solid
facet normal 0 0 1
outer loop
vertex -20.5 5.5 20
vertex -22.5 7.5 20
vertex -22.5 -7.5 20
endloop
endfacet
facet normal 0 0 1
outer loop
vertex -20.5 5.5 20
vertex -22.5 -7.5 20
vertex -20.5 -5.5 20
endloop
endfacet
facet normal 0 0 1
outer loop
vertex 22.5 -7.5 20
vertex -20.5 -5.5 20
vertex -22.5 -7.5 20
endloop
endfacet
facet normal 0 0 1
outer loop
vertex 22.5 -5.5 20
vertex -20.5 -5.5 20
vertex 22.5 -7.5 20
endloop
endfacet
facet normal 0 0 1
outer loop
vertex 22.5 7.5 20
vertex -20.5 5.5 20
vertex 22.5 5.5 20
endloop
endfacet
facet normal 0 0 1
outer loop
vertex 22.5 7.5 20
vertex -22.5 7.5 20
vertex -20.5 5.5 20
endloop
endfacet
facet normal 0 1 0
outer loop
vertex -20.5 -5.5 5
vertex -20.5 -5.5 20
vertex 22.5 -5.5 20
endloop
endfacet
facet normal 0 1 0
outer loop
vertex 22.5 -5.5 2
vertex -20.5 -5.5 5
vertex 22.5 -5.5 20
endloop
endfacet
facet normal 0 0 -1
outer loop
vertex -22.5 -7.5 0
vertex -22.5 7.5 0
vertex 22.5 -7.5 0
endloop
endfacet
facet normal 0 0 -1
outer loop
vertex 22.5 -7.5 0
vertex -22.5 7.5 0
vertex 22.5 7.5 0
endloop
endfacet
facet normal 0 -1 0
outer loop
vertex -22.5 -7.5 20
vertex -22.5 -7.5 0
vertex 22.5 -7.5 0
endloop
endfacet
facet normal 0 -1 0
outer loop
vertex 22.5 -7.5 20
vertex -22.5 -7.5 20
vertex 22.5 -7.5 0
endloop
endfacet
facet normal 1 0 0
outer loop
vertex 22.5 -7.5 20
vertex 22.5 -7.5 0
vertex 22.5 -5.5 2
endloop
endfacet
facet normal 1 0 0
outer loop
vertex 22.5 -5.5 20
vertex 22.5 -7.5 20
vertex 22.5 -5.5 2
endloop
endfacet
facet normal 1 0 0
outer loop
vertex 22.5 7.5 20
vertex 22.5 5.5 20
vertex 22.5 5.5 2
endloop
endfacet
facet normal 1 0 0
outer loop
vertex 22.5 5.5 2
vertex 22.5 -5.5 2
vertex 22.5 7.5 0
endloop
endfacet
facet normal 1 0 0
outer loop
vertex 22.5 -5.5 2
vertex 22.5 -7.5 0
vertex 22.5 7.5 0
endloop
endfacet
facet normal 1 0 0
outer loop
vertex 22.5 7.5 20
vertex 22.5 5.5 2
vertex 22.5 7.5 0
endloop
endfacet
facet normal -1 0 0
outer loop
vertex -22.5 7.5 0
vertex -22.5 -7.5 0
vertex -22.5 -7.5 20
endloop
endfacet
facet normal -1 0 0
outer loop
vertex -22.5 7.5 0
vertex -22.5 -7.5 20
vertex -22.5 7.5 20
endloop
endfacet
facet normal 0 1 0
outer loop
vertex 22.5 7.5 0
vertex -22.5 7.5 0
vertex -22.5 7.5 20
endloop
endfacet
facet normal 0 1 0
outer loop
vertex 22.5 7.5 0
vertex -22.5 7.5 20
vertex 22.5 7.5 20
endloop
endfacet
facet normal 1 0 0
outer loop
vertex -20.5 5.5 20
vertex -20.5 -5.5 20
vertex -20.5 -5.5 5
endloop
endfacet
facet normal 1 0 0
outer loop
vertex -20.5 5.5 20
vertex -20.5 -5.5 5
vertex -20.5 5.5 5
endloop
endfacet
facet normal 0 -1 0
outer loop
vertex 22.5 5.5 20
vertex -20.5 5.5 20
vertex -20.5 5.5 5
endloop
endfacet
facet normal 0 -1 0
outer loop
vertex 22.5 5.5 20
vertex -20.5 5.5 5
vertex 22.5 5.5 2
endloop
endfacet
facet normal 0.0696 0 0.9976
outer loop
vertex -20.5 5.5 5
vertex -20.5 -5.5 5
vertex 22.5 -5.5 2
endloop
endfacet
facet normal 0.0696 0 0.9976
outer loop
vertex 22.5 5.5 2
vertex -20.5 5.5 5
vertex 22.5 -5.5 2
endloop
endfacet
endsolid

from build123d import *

# Parameters (mm, degrees)
F0_W     = 45
F0_H     = 15
F1_DEPTH = 20
F2_W     = 43
F2_H     = 11
F3_DEPTH = 15
F5_START = -2
F5_DEPTH = 11


with BuildPart() as f1:
    # F0 (on Top) → F1 (new body)
    with BuildSketch(Plane.XY):
        Rectangle(F0_W, F0_H)
    extrude(amount=F1_DEPTH)

    # F2 (on face) → F3 (cut)
    with BuildSketch(Plane.XY.offset(20)):
        with Locations((1, 0)):
            Rectangle(F2_W, F2_H)
    extrude(amount=-F3_DEPTH, mode=Mode.SUBTRACT)

    # F4 (on face) → F5 (cut)
    with BuildSketch(Plane.XZ.offset(7.5).offset(F5_START)):
        Polygon((22.5, 5), (-20.5, 5), (22.5, 2), align=None)
    extrude(amount=-F5_DEPTH, mode=Mode.SUBTRACT)


solid = f1.part
